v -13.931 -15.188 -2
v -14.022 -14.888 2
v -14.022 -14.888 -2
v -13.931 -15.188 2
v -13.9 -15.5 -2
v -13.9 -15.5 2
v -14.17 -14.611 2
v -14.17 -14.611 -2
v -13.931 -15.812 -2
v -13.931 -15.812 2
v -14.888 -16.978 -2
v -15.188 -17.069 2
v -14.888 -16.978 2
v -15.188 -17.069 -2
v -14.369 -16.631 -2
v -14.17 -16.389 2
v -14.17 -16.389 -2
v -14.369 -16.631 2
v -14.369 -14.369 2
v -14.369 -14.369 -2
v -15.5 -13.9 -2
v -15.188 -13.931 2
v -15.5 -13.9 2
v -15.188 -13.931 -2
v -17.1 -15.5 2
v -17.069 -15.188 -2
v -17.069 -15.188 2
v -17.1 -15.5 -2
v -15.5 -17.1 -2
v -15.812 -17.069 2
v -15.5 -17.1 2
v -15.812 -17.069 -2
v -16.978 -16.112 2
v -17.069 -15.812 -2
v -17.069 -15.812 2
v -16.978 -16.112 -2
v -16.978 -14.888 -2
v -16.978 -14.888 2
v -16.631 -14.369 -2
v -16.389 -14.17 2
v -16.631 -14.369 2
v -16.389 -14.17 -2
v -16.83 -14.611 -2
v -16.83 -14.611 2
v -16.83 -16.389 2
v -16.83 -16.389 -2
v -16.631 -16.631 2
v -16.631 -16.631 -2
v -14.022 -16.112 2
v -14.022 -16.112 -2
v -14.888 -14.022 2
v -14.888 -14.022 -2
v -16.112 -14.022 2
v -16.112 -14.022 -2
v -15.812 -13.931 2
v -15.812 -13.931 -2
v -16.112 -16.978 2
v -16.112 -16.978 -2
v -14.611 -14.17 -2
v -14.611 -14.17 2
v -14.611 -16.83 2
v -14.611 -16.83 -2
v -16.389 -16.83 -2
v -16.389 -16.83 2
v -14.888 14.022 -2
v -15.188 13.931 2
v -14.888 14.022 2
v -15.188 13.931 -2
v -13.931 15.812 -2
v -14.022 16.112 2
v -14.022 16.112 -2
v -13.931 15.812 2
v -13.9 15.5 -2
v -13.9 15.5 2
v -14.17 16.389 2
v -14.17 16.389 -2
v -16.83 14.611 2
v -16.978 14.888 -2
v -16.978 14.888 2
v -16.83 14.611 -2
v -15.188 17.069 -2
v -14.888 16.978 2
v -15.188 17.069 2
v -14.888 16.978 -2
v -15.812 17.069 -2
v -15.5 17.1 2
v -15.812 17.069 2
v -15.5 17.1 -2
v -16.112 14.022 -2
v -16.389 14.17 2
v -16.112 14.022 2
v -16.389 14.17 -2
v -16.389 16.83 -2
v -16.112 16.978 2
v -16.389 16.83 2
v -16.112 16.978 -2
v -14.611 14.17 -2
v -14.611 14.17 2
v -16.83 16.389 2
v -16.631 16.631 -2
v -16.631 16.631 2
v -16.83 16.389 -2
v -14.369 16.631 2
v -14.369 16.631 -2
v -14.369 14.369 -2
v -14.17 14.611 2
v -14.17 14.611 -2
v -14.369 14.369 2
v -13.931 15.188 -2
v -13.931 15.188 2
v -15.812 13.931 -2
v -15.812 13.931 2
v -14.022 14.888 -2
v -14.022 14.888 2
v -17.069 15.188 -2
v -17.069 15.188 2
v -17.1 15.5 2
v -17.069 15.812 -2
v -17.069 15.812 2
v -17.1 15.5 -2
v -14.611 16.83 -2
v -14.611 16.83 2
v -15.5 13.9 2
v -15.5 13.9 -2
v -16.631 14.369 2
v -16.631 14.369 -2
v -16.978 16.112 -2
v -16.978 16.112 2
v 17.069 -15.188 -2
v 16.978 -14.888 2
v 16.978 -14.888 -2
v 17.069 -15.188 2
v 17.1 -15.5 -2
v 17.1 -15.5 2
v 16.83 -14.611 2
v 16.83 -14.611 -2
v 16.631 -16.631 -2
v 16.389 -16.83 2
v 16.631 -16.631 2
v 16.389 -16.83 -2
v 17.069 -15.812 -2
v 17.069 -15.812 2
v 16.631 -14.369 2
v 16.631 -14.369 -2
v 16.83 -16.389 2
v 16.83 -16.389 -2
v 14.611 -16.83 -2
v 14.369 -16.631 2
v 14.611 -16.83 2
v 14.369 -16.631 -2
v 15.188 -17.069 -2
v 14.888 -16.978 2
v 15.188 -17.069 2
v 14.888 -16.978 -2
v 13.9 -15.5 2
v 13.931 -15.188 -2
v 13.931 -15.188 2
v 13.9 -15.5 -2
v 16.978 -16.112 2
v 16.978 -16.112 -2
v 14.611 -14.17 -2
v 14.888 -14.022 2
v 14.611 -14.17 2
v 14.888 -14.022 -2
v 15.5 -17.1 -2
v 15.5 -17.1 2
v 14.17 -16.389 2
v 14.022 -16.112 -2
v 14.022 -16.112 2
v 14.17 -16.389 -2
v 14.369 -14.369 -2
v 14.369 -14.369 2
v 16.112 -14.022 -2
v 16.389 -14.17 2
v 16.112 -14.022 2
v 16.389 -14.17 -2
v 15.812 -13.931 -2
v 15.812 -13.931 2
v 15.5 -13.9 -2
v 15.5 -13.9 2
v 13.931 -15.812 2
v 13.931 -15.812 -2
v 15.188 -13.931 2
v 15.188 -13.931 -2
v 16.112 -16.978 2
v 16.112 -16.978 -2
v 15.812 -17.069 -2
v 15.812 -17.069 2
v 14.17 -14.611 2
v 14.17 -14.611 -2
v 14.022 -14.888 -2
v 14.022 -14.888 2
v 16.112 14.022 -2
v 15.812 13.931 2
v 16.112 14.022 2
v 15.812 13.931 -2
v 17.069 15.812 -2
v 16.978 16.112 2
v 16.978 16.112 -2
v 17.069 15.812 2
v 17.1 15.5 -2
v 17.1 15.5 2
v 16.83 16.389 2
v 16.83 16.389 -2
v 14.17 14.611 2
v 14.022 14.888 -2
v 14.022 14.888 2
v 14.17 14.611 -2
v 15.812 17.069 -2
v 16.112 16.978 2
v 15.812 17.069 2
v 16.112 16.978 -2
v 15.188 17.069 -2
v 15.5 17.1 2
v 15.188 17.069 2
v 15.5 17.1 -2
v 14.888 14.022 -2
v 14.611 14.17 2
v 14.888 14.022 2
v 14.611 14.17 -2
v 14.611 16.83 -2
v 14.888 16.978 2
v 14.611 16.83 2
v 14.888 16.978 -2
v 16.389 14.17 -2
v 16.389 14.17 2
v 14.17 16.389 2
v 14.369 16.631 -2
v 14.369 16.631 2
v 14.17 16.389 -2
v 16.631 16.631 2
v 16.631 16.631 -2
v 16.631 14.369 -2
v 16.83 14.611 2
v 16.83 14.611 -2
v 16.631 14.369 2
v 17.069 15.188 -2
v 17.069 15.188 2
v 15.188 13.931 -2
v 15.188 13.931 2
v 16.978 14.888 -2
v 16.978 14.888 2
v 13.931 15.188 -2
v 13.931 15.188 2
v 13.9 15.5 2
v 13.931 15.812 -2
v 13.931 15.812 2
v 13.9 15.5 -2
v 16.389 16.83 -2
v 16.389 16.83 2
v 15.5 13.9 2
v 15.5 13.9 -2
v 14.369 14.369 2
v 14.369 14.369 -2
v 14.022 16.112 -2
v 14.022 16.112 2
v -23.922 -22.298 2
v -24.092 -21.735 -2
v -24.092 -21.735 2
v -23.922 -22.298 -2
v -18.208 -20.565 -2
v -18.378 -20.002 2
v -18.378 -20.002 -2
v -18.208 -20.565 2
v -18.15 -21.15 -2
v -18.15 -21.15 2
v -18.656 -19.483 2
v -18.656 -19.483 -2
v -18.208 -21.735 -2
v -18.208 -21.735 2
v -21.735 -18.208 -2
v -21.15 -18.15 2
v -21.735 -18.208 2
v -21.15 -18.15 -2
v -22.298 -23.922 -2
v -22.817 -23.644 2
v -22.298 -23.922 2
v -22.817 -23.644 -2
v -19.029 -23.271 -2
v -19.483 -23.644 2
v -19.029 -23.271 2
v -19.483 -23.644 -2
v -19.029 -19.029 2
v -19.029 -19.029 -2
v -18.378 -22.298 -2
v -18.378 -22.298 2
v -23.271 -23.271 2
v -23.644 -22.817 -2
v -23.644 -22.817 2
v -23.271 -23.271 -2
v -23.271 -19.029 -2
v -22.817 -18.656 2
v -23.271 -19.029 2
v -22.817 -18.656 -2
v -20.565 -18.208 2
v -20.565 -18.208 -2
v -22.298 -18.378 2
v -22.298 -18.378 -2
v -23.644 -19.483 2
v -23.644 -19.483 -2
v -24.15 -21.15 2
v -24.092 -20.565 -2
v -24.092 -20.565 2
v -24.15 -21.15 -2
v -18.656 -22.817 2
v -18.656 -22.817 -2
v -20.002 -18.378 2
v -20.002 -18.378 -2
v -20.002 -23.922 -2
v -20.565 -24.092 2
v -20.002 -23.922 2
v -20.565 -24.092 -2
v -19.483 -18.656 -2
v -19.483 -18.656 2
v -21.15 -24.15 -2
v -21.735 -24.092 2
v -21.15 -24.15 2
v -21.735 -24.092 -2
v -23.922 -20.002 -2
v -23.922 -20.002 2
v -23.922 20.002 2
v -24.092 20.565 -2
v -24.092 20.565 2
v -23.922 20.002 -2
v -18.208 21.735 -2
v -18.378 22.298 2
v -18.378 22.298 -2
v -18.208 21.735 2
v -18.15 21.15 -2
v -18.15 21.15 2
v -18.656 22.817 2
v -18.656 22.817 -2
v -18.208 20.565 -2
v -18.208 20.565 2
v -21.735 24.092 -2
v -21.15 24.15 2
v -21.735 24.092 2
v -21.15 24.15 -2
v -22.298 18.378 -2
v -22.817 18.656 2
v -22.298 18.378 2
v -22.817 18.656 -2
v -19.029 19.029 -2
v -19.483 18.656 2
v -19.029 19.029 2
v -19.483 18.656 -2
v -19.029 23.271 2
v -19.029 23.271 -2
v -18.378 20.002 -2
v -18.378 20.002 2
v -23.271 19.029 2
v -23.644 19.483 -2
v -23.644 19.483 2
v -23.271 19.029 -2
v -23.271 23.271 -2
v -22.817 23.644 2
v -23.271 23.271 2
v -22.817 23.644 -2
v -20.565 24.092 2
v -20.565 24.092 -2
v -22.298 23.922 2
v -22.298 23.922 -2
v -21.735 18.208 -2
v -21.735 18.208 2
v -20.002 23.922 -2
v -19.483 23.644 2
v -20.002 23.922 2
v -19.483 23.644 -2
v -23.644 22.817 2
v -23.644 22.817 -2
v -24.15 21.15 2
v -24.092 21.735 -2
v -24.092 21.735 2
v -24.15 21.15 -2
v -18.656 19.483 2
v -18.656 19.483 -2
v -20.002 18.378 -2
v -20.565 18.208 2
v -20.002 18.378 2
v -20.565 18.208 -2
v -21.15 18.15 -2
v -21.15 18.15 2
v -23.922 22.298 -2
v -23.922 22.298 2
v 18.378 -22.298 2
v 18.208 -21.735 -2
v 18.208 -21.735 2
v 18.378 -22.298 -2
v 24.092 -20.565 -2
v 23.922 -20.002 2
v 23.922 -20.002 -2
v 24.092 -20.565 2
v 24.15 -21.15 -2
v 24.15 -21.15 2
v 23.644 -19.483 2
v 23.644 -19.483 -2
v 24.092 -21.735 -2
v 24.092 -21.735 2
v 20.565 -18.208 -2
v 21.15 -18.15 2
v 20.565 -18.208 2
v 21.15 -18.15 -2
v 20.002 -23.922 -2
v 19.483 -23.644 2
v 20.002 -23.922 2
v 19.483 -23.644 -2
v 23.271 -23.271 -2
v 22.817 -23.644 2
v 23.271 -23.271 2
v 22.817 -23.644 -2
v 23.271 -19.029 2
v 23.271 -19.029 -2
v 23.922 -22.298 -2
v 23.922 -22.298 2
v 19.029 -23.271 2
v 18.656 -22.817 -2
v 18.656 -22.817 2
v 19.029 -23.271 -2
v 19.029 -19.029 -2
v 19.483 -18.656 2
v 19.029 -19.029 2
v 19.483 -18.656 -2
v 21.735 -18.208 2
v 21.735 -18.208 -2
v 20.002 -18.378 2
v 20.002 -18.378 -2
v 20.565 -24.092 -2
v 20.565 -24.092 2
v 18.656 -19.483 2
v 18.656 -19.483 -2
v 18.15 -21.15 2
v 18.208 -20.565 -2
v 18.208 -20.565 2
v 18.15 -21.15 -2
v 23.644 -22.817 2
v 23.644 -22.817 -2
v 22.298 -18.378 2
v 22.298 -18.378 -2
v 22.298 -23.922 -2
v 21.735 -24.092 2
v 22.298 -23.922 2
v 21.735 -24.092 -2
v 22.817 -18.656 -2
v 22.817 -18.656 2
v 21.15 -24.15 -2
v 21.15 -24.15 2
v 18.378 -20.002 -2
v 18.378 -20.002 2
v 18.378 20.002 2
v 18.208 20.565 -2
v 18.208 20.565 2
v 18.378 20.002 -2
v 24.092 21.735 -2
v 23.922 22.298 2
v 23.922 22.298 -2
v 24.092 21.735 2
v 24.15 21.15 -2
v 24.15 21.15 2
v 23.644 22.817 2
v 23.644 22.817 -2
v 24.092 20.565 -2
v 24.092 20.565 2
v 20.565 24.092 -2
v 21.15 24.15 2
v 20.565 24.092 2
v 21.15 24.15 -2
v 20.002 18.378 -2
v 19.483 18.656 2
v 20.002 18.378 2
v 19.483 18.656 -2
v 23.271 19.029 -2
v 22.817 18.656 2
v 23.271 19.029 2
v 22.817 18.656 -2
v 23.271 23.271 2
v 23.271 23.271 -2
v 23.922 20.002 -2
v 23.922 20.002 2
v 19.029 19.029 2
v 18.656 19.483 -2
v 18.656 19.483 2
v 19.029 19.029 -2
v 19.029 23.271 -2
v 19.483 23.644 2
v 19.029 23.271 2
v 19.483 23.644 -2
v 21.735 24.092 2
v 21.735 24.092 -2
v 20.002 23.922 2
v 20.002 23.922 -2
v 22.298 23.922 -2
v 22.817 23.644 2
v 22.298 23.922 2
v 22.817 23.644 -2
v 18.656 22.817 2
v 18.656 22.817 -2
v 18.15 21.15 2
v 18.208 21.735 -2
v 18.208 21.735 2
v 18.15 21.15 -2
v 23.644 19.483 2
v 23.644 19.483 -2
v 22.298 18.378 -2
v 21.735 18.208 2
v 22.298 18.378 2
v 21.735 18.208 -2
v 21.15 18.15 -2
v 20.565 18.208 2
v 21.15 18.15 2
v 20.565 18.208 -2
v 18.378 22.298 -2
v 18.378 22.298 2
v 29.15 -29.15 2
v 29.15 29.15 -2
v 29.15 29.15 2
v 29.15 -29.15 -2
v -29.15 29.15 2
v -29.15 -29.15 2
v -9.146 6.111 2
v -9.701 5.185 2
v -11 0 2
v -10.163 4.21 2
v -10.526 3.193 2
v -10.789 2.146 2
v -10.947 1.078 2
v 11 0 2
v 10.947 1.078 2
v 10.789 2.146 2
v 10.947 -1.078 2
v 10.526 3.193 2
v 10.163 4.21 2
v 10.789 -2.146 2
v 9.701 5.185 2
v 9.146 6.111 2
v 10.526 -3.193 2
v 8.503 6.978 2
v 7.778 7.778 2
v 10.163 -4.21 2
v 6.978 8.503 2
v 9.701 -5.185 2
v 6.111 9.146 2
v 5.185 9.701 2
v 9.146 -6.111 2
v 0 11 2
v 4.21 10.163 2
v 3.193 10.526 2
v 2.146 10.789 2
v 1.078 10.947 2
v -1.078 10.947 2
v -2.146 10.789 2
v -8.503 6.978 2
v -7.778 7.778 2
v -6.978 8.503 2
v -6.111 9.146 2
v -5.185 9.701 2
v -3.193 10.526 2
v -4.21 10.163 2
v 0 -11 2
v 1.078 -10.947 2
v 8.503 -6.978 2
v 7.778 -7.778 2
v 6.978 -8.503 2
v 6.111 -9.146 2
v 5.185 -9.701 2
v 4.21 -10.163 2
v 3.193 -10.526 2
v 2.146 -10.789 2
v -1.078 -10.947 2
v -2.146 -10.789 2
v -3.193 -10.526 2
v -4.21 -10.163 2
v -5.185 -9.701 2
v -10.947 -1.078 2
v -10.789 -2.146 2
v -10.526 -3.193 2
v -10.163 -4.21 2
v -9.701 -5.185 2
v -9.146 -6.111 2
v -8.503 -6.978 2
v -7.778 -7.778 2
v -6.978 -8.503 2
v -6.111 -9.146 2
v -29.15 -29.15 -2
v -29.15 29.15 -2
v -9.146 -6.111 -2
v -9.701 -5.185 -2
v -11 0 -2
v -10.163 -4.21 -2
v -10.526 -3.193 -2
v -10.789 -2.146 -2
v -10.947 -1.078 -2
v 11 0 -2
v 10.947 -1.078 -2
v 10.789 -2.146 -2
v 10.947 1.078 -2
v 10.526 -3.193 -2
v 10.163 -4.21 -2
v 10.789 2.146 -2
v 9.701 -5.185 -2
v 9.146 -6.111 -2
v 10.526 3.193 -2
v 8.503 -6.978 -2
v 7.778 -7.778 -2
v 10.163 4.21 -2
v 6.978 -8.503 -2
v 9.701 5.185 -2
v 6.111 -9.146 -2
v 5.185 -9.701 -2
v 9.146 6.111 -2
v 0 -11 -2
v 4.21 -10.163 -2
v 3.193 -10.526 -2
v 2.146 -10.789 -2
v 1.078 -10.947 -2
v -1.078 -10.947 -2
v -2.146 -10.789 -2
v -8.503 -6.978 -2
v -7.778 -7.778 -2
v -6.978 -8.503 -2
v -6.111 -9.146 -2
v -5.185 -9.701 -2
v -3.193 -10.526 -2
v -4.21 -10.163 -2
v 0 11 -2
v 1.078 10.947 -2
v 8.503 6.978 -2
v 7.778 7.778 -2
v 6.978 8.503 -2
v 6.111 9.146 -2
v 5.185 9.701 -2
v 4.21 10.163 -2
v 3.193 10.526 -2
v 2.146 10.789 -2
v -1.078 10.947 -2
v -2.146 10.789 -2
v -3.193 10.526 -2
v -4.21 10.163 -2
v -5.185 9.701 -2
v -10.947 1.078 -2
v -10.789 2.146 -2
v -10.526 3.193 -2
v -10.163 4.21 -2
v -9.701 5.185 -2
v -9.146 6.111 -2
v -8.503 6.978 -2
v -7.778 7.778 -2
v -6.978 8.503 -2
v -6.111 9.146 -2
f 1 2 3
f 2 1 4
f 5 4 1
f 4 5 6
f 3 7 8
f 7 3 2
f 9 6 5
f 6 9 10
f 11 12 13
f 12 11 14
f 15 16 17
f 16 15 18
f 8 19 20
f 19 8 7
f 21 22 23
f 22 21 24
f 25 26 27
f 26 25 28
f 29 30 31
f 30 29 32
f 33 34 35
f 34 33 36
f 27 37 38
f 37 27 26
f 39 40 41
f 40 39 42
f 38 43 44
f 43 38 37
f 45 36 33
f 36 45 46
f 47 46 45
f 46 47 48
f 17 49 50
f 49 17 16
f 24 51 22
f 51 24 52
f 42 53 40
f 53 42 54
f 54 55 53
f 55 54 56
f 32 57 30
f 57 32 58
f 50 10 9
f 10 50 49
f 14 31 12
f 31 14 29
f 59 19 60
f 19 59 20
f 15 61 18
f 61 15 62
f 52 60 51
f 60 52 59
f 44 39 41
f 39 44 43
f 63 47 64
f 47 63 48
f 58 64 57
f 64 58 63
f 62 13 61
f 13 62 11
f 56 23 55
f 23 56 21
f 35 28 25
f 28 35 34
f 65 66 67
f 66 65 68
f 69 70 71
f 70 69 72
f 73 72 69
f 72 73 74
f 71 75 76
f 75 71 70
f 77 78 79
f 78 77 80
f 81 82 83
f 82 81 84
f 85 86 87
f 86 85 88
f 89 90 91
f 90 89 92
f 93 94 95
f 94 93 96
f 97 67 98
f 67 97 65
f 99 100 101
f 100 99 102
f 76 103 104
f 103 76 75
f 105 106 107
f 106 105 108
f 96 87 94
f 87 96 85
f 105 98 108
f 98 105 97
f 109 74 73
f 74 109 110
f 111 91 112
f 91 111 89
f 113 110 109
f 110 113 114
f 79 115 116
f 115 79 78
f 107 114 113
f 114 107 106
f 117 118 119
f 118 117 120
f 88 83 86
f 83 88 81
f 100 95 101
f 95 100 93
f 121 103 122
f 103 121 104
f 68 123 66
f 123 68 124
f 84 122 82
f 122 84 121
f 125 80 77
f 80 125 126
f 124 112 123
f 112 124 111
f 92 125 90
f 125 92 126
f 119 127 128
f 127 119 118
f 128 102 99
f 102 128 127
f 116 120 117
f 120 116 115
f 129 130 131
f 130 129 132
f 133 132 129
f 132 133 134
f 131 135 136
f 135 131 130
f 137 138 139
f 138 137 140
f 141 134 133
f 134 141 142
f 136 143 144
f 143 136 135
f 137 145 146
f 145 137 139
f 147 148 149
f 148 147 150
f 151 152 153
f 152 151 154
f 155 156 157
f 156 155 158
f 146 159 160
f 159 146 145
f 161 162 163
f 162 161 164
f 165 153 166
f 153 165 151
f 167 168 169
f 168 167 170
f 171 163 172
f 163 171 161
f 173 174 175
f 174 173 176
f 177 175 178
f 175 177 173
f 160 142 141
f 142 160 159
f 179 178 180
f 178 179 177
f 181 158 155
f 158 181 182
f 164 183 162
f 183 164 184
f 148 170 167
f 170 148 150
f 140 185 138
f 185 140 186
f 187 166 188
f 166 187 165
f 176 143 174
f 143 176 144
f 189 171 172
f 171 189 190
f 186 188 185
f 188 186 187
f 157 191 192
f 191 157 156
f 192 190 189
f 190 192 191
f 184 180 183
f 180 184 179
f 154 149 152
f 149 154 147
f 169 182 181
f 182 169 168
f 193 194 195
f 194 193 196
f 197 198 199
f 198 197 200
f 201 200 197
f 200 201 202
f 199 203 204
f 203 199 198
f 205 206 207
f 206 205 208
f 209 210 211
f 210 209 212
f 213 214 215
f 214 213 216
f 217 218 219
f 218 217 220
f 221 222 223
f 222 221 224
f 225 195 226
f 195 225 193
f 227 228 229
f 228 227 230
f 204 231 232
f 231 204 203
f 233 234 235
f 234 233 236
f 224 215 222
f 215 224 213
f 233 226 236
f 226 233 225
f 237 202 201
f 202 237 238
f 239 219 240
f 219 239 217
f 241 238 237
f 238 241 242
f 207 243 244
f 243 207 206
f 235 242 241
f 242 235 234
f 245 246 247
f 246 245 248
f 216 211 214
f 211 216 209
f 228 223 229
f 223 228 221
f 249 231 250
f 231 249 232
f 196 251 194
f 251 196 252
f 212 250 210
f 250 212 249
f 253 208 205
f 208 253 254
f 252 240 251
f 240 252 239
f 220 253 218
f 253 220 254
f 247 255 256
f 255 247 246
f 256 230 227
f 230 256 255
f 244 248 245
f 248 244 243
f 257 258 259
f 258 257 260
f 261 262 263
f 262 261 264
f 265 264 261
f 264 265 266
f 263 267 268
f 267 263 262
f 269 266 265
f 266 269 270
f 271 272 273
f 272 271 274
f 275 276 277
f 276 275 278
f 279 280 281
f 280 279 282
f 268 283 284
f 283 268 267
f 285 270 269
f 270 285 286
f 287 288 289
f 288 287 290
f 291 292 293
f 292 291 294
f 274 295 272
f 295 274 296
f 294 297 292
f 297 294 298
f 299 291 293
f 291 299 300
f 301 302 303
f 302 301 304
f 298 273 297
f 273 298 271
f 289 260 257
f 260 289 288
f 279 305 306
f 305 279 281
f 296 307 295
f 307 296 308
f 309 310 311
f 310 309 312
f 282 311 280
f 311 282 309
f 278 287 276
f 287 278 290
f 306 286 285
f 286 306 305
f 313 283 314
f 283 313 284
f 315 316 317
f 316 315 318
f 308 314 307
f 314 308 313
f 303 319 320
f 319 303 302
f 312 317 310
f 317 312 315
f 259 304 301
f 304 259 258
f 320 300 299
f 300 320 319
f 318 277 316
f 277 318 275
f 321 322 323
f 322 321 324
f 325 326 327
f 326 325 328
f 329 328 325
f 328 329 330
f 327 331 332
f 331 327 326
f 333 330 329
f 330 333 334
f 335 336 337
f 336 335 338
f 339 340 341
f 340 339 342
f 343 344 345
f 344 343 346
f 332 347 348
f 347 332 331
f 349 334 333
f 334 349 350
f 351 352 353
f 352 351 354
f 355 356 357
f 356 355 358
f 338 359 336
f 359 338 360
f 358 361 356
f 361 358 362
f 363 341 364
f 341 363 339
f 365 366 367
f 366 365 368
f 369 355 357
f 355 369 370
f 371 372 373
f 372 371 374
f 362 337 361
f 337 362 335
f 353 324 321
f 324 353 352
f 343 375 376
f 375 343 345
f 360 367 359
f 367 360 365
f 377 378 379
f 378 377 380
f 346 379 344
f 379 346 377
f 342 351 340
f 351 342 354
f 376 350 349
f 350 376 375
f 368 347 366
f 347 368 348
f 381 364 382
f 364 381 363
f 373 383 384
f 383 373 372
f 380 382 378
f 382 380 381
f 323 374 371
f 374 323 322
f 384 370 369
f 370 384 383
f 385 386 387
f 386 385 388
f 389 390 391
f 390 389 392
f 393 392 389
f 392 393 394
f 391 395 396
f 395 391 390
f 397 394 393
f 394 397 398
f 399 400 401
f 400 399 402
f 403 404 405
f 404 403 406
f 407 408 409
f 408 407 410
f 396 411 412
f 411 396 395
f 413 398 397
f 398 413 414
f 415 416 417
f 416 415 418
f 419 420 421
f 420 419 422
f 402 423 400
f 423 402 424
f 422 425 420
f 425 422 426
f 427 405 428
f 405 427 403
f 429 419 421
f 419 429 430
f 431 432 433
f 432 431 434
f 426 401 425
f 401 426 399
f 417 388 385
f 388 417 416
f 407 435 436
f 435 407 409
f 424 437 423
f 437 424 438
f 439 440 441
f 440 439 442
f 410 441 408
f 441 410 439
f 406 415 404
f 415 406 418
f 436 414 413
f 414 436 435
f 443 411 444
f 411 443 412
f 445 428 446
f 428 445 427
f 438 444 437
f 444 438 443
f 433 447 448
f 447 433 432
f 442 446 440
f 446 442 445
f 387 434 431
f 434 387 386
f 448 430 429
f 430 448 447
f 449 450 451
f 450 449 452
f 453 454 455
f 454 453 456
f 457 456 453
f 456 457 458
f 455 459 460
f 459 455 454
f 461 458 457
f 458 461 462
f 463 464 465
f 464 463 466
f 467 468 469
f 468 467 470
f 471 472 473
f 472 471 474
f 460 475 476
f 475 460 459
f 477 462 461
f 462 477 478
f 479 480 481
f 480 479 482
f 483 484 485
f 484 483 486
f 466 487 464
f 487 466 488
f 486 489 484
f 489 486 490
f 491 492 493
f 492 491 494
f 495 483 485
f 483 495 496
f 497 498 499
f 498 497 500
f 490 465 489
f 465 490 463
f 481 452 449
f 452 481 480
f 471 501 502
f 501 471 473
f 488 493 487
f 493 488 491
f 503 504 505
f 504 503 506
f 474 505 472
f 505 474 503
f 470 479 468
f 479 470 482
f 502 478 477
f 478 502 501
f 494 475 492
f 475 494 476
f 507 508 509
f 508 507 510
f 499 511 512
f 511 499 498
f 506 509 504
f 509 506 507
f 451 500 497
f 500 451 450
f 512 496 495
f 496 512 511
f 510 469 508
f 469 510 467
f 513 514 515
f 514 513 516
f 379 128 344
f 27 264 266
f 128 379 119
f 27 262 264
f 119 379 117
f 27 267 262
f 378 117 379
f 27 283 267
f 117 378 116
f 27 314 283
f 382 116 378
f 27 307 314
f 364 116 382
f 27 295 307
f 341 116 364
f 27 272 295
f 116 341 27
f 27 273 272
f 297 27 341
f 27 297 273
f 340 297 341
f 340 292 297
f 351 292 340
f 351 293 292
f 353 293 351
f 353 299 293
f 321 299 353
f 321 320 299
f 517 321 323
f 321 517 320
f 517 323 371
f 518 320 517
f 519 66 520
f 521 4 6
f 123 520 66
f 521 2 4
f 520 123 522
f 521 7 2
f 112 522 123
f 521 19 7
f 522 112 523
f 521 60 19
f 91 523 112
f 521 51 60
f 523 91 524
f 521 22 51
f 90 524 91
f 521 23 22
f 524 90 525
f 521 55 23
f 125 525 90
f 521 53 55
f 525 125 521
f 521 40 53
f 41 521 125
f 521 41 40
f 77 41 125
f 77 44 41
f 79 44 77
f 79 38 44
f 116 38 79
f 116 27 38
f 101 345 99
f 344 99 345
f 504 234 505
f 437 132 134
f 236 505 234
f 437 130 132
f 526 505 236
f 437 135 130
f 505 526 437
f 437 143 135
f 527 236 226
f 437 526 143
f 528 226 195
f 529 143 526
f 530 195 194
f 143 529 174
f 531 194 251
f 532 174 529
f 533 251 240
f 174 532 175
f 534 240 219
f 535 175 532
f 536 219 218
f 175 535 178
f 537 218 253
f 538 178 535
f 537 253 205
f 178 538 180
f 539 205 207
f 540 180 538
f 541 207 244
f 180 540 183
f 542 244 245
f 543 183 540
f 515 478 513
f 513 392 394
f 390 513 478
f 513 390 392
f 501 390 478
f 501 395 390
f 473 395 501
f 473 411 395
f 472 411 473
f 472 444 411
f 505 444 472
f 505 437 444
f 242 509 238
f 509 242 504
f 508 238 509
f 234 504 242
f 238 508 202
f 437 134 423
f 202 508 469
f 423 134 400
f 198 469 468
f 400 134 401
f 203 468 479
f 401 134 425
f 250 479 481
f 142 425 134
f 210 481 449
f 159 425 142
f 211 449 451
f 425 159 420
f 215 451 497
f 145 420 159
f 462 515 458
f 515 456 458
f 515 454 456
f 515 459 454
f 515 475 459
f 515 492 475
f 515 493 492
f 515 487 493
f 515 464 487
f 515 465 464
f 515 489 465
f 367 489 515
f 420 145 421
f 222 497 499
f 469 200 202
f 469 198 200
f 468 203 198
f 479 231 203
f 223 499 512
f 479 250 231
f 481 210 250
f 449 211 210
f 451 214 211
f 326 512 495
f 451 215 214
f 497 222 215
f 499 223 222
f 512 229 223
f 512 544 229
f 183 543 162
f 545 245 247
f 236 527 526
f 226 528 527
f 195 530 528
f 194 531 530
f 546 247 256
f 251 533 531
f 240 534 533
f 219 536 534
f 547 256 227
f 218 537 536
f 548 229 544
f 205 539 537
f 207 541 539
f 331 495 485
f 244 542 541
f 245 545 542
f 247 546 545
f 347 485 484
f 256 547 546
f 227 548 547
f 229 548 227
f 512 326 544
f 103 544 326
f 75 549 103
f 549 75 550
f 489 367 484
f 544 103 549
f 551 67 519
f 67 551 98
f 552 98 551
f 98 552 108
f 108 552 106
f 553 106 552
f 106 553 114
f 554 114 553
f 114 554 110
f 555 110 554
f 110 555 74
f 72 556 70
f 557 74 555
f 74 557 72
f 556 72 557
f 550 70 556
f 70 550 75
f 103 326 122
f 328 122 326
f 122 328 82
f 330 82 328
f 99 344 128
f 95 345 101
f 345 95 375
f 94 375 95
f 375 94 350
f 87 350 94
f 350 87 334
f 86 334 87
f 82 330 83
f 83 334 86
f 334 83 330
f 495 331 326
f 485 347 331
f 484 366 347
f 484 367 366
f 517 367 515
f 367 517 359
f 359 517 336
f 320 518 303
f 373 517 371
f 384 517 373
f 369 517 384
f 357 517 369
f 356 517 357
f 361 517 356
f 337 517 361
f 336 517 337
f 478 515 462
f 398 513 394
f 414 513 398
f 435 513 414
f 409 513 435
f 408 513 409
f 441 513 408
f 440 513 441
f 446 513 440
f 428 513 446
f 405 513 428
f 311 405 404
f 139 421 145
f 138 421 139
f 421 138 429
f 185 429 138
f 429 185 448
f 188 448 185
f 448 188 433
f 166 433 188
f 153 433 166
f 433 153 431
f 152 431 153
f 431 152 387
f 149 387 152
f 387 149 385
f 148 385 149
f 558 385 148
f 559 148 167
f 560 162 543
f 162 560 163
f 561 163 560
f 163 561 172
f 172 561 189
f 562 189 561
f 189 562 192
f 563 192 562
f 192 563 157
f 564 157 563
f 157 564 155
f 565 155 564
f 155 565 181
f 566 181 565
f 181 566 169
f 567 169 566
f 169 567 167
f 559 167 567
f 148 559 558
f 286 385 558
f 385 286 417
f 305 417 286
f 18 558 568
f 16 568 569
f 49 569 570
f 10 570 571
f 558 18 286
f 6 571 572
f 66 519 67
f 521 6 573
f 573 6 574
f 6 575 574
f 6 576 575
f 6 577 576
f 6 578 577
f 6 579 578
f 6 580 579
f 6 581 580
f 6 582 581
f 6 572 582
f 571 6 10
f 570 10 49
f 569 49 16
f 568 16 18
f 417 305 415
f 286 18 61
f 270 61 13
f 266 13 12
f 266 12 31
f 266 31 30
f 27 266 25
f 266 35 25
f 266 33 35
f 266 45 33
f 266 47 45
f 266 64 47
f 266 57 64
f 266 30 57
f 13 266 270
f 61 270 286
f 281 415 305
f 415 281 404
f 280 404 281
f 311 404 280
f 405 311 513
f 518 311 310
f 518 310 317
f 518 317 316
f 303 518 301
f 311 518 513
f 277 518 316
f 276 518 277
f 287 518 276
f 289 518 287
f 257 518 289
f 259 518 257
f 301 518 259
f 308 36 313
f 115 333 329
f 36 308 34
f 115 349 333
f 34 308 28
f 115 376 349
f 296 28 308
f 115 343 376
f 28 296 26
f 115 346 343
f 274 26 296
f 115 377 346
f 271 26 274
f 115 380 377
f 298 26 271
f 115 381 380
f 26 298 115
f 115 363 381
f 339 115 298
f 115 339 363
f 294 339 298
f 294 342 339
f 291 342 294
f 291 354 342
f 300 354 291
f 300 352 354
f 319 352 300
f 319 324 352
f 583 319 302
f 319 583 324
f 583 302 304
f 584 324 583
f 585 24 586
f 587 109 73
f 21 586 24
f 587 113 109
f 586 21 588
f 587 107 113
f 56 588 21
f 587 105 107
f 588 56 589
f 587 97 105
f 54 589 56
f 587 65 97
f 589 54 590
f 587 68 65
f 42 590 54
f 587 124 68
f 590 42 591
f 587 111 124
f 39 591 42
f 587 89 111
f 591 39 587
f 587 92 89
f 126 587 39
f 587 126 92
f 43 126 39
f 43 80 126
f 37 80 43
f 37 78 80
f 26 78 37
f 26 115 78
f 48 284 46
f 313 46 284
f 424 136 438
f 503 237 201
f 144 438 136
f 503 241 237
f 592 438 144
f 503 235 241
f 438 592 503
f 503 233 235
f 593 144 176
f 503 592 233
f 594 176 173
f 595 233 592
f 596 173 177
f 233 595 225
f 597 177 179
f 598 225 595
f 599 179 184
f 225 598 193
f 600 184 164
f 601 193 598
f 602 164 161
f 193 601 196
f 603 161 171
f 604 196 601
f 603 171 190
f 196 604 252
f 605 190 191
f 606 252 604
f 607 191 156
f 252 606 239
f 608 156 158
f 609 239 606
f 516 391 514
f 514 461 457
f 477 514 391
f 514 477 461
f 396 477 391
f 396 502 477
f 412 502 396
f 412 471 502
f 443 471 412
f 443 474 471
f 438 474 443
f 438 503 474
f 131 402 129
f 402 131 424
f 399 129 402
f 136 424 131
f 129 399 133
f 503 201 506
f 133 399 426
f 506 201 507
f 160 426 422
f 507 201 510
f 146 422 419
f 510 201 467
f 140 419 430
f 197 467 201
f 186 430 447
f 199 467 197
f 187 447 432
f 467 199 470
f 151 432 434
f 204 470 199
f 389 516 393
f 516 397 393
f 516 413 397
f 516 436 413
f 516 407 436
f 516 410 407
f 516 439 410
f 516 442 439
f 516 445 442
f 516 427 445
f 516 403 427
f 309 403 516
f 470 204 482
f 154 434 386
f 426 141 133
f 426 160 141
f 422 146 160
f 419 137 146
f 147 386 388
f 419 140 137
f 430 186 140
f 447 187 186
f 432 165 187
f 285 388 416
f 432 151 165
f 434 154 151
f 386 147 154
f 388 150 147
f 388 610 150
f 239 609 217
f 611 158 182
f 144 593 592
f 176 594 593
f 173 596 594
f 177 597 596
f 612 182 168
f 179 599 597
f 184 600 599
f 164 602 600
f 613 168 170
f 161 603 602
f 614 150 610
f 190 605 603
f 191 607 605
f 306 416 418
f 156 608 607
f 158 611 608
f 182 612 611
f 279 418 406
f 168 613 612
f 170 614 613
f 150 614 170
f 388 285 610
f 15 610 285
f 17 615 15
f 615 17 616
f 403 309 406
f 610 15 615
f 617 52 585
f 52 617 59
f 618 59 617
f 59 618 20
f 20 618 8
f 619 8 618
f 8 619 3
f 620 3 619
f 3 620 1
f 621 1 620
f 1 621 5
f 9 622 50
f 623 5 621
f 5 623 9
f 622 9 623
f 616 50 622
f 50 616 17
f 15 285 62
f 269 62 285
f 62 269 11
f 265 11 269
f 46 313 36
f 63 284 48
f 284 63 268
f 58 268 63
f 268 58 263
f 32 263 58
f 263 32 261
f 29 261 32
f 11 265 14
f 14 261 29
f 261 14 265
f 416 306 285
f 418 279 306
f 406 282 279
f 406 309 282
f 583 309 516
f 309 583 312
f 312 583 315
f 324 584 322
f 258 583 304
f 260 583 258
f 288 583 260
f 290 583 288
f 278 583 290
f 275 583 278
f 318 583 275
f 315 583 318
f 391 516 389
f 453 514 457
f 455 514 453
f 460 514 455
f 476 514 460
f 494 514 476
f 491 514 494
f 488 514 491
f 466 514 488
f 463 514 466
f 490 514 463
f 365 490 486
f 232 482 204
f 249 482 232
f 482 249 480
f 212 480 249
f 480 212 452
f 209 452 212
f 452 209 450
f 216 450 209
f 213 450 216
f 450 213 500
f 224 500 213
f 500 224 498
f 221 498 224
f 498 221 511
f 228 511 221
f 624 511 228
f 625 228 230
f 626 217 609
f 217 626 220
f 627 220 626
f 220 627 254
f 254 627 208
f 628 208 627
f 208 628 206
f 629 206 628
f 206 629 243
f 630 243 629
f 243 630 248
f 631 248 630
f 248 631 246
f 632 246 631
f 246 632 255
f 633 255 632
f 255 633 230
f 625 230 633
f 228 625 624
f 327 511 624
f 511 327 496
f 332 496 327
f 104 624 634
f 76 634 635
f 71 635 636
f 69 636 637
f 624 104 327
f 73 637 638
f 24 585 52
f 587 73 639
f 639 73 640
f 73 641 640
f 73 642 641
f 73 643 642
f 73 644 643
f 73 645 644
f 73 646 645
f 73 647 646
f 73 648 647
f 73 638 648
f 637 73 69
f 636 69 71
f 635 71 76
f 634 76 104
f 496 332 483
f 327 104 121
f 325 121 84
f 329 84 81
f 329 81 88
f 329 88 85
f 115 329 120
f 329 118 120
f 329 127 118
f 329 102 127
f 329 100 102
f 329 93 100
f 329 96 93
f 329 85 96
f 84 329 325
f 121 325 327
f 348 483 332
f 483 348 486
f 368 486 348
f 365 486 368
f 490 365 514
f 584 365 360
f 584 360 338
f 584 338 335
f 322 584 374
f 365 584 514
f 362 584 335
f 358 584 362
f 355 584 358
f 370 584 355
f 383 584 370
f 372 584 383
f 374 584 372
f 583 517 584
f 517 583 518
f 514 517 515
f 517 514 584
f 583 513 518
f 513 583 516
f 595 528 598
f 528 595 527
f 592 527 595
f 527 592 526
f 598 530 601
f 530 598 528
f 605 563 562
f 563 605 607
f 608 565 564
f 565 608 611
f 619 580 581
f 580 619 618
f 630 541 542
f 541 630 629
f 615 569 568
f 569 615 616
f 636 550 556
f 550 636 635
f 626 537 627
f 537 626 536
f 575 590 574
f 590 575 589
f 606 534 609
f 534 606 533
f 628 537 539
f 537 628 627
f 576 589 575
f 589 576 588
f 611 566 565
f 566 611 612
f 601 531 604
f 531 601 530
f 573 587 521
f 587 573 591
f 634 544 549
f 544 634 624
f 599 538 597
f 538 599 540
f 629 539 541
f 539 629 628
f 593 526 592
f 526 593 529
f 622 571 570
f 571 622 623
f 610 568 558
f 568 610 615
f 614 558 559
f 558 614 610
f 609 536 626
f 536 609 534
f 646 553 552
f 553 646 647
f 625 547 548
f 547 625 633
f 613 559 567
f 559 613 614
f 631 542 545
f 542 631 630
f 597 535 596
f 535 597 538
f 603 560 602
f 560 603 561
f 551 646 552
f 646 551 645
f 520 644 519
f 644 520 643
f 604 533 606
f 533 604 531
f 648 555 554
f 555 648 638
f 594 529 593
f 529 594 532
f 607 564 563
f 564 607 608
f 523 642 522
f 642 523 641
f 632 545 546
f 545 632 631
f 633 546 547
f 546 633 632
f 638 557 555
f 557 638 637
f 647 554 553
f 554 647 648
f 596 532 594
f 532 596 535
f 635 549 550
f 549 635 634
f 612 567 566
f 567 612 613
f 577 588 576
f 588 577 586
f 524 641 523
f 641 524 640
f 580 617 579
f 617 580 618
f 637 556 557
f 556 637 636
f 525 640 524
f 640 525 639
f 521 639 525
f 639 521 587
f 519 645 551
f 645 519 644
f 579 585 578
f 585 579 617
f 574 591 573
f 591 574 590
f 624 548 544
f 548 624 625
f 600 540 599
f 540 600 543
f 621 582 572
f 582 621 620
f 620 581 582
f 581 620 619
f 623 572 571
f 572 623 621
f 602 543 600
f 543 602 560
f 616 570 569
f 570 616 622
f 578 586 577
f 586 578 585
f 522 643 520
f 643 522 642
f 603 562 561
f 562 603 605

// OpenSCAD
// NEMA 17 Stepper Motor Mount
// NEMA 17: 42.3mm face, 31mm mounting holes, 22mm boss
nema_size = 42.3;
hole_spacing = 31;
center_bore = 22;
plate_thickness = 4;
flange = 8;

difference() {
    // Main plate
    cube([nema_size + flange*2, nema_size + flange*2, plate_thickness], center=true);

    // Center bore for shaft/boss clearance
    cylinder(d=center_bore, h=plate_thickness+1, center=true, $fn=64);

    // NEMA 17 mounting holes (M3)
    for (x = [-1, 1]) {
        for (y = [-1, 1]) {
            translate([x * hole_spacing/2, y * hole_spacing/2, 0])
                cylinder(d=3.2, h=plate_thickness+1, center=true, $fn=32);
        }
    }

    // Corner reliefs
    for (x = [-1, 1]) {
        for (y = [-1, 1]) {
            translate([x * nema_size/2, y * nema_size/2, 0])
                cylinder(d=6, h=plate_thickness+1, center=true, $fn=32);
        }
    }
}
